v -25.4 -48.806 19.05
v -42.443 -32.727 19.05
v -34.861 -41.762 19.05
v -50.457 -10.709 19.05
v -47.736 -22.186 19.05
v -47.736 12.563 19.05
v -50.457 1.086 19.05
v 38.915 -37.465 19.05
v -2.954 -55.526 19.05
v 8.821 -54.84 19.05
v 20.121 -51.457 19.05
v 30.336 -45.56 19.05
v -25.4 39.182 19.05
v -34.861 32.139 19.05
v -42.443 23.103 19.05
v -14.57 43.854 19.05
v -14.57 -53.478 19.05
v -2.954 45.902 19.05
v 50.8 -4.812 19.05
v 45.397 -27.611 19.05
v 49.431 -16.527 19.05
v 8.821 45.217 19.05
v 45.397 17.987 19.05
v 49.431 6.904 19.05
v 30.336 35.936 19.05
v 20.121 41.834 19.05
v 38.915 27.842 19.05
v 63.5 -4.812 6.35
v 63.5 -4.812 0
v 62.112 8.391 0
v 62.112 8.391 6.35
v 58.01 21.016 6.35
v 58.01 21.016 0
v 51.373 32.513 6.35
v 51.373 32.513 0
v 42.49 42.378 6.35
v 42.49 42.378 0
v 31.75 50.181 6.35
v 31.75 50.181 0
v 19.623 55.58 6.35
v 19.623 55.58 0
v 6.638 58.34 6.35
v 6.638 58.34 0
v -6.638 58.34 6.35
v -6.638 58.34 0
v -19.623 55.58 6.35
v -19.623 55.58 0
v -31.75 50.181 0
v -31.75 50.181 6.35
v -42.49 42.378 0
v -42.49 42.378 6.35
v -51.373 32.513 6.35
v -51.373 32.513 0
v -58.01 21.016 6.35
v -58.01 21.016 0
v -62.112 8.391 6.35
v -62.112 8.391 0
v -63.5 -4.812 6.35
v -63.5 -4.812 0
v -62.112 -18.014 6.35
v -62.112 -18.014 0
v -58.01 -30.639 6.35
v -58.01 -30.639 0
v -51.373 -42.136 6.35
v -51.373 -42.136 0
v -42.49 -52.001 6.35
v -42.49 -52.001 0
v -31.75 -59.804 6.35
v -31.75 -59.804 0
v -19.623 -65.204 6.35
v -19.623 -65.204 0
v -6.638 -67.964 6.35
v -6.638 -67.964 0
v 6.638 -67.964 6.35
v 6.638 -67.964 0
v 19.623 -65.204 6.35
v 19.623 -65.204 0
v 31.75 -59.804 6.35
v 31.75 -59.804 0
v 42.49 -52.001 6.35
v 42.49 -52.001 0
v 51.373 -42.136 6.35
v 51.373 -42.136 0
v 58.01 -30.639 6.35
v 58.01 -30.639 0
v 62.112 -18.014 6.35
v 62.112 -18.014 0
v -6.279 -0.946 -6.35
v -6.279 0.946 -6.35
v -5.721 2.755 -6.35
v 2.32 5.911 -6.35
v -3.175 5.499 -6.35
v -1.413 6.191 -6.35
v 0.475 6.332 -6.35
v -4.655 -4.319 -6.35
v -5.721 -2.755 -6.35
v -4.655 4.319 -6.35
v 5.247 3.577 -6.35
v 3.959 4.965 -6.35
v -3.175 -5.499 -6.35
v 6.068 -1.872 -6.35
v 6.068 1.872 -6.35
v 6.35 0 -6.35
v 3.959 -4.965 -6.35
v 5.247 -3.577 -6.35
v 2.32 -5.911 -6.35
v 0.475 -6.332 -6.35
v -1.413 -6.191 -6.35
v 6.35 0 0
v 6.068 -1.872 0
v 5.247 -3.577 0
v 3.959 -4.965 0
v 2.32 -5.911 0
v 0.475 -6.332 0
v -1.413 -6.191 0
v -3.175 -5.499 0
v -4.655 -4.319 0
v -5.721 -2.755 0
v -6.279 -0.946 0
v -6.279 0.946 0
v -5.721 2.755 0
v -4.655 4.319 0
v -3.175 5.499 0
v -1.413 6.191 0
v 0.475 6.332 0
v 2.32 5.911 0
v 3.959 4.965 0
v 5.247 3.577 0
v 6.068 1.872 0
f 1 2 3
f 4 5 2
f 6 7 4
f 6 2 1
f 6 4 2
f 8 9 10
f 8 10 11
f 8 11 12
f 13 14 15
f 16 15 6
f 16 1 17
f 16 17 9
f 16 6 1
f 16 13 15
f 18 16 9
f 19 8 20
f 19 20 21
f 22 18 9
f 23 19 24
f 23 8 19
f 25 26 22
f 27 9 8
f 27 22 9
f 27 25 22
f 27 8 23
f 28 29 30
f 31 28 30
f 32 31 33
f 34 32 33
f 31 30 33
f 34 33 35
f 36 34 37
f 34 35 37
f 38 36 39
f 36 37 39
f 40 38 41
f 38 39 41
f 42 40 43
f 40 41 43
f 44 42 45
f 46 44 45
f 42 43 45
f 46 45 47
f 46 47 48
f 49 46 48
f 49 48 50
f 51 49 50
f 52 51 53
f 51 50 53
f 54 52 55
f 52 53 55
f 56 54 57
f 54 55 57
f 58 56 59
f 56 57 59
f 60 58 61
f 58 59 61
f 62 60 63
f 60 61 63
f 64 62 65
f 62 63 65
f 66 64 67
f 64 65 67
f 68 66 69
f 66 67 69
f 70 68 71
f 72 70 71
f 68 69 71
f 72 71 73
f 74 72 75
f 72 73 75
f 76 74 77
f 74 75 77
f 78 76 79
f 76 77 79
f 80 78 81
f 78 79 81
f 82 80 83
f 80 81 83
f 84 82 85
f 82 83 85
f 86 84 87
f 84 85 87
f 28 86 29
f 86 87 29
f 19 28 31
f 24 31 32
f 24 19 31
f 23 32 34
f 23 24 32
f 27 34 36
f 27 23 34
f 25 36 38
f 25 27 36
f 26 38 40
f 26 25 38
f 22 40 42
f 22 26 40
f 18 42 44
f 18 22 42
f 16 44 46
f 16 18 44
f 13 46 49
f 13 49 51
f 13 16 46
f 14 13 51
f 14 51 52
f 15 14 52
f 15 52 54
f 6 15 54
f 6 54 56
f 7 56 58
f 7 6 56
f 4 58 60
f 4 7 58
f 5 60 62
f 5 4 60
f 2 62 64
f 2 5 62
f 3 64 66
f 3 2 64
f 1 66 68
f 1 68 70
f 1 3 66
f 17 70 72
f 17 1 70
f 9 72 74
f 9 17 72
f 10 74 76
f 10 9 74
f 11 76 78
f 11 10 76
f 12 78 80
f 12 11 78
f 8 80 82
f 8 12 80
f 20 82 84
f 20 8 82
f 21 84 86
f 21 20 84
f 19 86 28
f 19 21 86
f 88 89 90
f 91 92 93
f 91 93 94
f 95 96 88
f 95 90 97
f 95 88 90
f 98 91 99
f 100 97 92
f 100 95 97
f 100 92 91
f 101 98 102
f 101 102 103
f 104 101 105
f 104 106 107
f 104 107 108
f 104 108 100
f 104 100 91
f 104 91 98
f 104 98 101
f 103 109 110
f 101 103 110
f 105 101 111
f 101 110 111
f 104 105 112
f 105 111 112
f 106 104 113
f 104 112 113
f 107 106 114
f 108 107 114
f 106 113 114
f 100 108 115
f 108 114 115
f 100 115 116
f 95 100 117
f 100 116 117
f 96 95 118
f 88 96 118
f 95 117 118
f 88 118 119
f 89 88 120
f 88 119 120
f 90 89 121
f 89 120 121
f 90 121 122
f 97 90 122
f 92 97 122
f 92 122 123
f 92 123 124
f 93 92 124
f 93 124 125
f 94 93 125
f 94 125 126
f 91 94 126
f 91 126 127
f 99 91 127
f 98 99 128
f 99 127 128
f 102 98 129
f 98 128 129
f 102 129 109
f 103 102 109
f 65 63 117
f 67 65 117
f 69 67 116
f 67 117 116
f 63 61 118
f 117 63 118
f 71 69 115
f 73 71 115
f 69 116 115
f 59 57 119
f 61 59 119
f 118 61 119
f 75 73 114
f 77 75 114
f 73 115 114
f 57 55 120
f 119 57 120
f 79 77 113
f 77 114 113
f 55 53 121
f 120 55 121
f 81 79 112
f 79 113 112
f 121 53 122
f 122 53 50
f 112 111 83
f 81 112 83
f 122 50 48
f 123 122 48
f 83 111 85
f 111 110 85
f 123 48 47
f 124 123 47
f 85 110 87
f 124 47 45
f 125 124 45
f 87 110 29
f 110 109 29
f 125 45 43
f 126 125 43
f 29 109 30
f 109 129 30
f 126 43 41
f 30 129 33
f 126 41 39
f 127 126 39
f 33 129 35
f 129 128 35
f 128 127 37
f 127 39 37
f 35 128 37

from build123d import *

# Parameters (mm, degrees)
F0_R     = 63.5
F1_DEPTH = 19.05
F2_R     = 6.35
F3_DEPTH = 6.35
F4_SIZE  = 12.7


with BuildPart() as f1:
    # F0 (on Top) → F1 (new body)
    with BuildSketch(Plane.XY):
        with Locations((0, -4.811709)):
            Circle(F0_R)
    extrude(amount=F1_DEPTH)

    # F2 (on face) → F3 (join)
    with BuildSketch(Plane(origin=(0, 0, 0), x_dir=(1, 0, 0), z_dir=(0, 0, -1))):
        Circle(F2_R)
    extrude(amount=F3_DEPTH)

    # F4
    f4_edges = [f1.edges().sort_by_distance(p)[0] for p in [
        (-63.5, -4.811709, 19.05),
    ]]
    chamfer(f4_edges, length=F4_SIZE)


solid = f1.part
